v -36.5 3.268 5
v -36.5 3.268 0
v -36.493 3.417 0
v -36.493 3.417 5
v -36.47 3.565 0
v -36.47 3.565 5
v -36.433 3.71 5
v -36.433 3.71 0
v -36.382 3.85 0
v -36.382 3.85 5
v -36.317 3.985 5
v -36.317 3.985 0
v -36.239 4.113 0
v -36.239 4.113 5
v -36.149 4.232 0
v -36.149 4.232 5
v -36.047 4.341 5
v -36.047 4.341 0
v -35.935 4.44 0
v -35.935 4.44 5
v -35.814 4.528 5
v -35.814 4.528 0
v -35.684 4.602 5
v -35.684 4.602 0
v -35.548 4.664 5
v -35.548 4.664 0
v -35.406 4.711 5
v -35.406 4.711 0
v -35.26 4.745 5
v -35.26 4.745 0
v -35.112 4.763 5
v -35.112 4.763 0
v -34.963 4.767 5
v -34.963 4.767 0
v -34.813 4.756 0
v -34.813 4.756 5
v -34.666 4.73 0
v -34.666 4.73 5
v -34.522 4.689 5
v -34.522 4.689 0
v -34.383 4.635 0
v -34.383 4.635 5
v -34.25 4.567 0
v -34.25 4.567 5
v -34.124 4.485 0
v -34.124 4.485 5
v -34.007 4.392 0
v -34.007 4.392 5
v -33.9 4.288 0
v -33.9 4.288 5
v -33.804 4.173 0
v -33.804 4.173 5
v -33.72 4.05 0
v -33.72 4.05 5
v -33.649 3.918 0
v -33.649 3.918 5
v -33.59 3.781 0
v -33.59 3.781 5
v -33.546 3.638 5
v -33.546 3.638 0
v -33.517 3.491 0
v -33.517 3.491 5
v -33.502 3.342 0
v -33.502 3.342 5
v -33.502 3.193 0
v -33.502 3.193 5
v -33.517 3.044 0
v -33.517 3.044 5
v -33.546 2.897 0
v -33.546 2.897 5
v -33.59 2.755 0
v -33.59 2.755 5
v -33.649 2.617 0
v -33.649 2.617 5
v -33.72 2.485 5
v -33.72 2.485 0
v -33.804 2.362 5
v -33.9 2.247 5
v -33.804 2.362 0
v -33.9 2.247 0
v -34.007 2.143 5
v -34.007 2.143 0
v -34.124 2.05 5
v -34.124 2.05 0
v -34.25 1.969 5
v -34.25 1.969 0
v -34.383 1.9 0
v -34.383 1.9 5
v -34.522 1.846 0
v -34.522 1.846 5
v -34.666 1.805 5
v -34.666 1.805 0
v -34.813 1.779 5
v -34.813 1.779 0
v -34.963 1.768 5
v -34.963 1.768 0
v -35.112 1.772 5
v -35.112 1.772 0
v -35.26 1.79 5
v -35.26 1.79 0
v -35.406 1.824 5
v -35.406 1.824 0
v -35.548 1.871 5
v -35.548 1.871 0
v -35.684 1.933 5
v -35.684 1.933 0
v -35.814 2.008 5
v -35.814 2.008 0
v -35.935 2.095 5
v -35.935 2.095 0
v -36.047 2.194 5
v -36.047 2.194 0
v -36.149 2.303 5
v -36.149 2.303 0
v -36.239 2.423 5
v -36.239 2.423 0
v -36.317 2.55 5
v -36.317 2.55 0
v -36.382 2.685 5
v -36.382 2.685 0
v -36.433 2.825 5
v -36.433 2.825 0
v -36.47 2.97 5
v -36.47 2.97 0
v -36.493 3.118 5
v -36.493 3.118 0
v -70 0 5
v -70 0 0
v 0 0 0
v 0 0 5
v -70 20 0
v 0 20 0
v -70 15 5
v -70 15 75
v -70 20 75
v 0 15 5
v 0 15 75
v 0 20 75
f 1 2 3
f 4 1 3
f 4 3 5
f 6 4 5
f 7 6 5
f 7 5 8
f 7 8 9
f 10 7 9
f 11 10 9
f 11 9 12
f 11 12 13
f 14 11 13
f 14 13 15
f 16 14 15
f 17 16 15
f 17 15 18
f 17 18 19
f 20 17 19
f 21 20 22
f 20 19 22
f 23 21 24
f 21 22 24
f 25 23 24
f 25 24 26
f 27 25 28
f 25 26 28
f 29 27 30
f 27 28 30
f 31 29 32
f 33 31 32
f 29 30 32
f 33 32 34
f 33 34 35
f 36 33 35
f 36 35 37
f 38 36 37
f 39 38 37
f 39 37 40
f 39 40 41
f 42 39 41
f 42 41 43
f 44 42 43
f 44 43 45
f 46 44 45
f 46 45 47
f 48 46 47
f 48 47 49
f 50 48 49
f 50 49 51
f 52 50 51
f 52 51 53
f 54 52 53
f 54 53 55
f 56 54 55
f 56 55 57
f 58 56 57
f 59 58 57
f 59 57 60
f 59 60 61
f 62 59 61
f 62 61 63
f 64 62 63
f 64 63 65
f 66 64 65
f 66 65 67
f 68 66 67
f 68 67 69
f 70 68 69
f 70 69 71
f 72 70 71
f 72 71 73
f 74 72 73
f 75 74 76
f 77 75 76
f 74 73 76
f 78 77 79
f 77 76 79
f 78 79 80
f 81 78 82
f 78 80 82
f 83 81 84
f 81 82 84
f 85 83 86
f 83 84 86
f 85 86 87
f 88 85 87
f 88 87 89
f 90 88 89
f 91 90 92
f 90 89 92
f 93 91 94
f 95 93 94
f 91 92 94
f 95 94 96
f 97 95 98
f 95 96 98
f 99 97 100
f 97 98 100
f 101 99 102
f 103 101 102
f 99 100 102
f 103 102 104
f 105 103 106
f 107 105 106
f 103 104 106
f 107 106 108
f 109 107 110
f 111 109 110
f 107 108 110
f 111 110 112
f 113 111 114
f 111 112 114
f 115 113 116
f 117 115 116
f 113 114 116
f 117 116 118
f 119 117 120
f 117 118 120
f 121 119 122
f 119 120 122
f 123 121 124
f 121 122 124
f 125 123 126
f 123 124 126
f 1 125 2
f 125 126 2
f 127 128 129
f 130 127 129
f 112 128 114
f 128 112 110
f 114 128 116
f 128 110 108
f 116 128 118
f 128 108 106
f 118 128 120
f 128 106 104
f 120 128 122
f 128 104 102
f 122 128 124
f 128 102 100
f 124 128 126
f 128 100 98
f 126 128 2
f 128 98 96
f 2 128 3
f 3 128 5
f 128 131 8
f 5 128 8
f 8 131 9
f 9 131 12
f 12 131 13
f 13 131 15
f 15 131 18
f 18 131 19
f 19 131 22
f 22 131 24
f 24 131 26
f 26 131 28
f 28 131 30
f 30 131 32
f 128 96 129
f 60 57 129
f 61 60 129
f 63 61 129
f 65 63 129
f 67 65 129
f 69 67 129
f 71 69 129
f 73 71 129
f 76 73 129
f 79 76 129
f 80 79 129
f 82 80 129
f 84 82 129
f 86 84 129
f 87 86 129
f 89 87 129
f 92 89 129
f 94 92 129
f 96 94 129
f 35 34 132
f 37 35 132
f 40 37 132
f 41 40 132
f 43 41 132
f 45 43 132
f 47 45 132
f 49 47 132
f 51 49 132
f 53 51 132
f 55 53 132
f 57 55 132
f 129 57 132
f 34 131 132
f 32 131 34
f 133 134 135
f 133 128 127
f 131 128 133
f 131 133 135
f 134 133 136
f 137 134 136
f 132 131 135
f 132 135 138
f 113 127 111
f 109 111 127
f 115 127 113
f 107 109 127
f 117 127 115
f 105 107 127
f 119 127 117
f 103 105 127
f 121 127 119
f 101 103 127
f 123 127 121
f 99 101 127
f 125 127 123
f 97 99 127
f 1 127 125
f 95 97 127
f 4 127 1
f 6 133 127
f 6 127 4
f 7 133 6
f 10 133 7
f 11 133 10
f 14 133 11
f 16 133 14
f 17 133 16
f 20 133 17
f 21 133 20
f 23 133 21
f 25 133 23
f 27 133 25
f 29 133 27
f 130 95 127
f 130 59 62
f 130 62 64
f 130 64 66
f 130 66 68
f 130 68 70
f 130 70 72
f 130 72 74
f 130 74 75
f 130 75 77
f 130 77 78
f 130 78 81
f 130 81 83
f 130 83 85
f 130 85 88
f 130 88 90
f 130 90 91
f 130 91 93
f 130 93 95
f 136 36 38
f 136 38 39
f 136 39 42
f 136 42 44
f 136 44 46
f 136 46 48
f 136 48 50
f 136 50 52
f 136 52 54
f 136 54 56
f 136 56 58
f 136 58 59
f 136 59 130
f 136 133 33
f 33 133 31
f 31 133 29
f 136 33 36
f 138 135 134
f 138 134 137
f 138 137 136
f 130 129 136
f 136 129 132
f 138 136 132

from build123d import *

# Parameters (mm, degrees)
ESQUISSE1_W             = 70
ESQUISSE1_H             = 20
BOSS_EXTRU_1_DEPTH      = 5
ESQUISSE2_W             = 70
ESQUISSE2_H             = 5
BOSS_EXTRU_2_DEPTH      = 70
ESQUISSE3_R             = 1.5
ENL_V_MAT_EXTRU_1_DEPTH = 60


with BuildPart() as part:
    # Esquisse1 → Boss.-Extru.1 (new body)
    with BuildSketch(Plane.XY):
        with Locations((-35, 10)):
            Rectangle(ESQUISSE1_W, ESQUISSE1_H)
    extrude(amount=BOSS_EXTRU_1_DEPTH)

    # Esquisse2 → Boss.-Extru.2 (add)
    with BuildSketch(Plane.XY.offset(5)):
        with Locations((-35, 17.5)):
            Rectangle(ESQUISSE2_W, ESQUISSE2_H)
    extrude(amount=BOSS_EXTRU_2_DEPTH)

    # Esquisse3 → Enlèv. mat.-Extru.1 (cut)
    with BuildSketch(Plane(origin=(0, 0, 0), x_dir=(-1, 0, 0), z_dir=(0, 0, -1))):
        with Locations((35, 3.26755804)):
            Circle(ESQUISSE3_R)
    extrude(amount=-ENL_V_MAT_EXTRU_1_DEPTH, mode=Mode.SUBTRACT)


solid = part.part
